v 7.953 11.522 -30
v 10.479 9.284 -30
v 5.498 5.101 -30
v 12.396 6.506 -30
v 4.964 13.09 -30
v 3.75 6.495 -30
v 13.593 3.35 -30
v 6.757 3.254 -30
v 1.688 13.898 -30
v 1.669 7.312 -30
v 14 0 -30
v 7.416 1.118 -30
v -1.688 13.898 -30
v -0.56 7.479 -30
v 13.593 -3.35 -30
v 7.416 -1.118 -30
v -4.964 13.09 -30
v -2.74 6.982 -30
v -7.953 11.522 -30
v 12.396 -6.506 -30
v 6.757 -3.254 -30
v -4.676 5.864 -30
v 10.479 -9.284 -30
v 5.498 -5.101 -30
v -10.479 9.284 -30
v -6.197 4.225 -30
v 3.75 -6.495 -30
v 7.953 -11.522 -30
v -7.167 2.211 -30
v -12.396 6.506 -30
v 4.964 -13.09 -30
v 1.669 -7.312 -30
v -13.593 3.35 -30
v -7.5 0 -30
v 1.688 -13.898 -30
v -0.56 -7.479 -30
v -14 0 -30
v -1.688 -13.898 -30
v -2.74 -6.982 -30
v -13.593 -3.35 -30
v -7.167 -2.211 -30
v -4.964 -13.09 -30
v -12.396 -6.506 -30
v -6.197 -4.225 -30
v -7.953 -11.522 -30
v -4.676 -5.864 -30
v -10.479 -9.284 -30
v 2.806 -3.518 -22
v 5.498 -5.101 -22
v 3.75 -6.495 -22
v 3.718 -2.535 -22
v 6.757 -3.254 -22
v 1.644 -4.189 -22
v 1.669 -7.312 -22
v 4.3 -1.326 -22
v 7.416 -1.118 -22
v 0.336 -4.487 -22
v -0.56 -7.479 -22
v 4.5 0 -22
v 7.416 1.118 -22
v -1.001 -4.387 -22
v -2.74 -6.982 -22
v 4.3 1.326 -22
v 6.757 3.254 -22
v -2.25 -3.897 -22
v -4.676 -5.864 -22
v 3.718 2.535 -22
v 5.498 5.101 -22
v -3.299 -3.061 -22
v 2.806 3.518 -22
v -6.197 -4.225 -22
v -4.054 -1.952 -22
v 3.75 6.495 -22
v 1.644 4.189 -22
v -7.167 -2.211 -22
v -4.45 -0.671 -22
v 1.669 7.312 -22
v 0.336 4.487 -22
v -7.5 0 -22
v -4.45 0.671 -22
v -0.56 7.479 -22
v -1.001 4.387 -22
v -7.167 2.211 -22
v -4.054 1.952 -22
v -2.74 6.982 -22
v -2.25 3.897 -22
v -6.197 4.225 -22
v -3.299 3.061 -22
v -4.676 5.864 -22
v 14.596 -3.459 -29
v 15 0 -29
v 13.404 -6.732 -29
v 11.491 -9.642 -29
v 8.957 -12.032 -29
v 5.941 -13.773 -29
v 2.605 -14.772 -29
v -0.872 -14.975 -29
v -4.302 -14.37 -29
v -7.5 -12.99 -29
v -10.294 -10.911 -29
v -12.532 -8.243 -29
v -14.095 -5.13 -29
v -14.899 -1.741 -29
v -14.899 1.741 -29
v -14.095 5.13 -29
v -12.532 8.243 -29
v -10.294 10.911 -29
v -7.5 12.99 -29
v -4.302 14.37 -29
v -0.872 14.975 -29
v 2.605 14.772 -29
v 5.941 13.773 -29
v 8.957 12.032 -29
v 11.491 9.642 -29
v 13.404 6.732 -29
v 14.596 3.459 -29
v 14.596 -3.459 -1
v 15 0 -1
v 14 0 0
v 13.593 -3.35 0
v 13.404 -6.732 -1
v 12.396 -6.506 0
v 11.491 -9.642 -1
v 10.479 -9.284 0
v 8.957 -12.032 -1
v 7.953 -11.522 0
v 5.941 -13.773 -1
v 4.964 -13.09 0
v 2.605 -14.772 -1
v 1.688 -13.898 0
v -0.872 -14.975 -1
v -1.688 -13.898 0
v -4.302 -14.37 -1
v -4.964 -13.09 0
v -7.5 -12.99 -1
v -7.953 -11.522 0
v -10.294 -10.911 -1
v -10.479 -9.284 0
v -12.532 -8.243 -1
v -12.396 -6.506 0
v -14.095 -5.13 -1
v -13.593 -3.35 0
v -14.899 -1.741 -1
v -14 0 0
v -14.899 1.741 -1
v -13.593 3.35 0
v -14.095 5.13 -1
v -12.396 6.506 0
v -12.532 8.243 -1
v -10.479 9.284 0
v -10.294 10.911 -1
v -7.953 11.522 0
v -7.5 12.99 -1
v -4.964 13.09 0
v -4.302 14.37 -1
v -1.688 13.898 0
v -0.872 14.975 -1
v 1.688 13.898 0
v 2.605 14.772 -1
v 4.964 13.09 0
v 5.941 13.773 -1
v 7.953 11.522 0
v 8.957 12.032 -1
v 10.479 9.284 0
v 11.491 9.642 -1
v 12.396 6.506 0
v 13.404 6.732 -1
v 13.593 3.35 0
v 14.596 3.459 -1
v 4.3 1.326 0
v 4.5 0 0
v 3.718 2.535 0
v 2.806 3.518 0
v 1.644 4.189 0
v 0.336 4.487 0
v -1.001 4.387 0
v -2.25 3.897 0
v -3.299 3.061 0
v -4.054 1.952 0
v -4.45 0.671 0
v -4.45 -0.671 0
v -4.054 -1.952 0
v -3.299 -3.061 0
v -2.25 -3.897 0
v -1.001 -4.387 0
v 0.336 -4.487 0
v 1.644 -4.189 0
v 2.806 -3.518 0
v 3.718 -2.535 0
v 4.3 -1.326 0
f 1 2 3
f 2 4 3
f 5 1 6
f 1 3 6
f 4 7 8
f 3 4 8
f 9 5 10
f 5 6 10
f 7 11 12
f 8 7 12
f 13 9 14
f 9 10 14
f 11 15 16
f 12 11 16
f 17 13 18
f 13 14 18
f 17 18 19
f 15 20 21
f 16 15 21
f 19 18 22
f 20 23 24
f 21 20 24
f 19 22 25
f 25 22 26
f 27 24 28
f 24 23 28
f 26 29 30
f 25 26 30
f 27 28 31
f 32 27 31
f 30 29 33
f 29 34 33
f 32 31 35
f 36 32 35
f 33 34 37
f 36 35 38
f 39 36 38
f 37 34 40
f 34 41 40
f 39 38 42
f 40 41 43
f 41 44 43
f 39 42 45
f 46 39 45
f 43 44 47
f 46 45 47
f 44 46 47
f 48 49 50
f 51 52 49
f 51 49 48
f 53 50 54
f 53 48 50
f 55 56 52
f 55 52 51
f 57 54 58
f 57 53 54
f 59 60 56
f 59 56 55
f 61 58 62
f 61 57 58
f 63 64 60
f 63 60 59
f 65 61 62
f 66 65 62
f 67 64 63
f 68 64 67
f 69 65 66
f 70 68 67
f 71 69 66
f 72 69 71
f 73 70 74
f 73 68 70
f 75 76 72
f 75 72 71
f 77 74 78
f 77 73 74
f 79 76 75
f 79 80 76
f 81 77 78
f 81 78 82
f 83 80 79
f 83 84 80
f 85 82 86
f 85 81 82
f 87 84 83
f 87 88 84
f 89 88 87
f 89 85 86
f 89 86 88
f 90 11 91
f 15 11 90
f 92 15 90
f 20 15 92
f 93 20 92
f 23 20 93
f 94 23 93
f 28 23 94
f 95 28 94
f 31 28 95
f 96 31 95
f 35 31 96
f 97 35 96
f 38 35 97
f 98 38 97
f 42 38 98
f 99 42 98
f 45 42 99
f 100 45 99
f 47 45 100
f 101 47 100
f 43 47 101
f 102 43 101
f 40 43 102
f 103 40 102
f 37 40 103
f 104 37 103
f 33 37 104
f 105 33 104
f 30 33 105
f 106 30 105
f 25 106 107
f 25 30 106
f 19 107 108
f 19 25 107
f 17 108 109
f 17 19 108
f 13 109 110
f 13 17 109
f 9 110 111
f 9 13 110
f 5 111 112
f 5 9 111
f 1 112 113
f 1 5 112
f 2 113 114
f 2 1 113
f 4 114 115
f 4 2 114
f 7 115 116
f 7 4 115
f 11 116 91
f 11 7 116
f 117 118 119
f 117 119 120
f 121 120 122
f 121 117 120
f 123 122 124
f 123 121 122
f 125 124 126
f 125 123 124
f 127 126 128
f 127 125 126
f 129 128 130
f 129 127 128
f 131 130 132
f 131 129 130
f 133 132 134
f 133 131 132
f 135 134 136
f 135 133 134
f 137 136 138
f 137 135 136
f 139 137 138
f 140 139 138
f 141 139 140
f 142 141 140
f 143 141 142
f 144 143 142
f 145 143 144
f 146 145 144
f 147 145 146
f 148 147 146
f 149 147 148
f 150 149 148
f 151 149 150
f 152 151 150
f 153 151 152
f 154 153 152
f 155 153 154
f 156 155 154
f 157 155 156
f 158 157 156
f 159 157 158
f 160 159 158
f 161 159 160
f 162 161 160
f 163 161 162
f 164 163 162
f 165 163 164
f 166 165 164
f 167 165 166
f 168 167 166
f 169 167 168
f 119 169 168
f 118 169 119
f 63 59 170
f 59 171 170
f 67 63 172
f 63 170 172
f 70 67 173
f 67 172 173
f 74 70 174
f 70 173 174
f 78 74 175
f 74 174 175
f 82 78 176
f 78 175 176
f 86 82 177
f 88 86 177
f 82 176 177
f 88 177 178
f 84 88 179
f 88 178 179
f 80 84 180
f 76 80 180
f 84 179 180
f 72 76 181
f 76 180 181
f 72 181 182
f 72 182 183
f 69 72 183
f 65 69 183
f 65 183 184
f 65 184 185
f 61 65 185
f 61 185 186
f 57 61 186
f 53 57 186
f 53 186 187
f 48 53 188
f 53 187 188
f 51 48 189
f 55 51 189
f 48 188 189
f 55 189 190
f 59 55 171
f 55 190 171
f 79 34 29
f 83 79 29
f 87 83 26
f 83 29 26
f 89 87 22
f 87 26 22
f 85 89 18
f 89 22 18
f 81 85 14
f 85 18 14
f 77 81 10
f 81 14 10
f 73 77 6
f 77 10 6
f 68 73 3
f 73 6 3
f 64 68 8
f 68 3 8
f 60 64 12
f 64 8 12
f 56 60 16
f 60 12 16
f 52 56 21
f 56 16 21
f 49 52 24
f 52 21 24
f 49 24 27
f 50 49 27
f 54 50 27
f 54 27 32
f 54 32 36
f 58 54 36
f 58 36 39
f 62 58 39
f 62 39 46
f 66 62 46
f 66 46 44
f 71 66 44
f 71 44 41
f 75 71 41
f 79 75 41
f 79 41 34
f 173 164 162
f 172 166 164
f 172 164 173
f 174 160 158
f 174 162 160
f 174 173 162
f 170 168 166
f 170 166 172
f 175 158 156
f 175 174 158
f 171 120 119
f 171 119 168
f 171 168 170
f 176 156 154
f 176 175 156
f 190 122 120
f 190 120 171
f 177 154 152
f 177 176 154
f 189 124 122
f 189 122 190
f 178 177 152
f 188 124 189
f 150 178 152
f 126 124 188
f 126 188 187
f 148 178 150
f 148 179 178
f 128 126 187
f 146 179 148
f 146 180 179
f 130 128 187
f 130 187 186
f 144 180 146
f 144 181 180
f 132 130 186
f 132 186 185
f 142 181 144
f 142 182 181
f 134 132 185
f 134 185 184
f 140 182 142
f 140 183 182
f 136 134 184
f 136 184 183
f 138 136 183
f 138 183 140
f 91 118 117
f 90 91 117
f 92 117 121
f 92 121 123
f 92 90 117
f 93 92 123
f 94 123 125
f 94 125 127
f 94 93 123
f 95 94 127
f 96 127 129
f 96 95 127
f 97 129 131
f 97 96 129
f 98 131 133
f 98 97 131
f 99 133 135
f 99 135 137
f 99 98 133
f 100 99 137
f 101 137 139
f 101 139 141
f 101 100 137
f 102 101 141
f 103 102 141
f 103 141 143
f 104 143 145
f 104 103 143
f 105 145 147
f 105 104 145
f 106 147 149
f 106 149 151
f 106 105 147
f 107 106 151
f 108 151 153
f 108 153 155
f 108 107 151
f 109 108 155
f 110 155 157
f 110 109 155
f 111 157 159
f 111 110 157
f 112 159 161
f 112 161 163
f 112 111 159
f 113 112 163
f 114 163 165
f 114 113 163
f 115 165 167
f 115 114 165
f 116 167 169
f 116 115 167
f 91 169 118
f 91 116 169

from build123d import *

# Parameters (mm, degrees)
SKETCH_1_W                   = 30
SKETCH_1_H                   = 15
HOLE_WIZARD_M8_1_D           = 9
HOLE_WIZARD_M8_1_CBORE_D     = 15
HOLE_WIZARD_M8_1_CBORE_DEPTH = 8
CHAMFER_1_SIZE               = 1


with BuildPart() as part:
    # 草圖1 → 旋轉1 (revolve)
    with BuildSketch(Plane(origin=(0, 0, 0), x_dir=(0, 0, -1), z_dir=(1, 0, 0)), mode=Mode.PRIVATE) as revolve_1_sk:
        with Locations((15, 7.5)):
            Rectangle(SKETCH_1_W, SKETCH_1_H)
    revolve(revolve_1_sk.sketch.rotate(Axis((0, 0, 2.831513271), (0, 0, -1)), 90), axis=Axis((0, 0, 2.831513271), (0, 0, -1)))

    # M8 六角承窩頭蓋螺釘的柱孔1 (through all)
    with Locations(Plane(origin=(0, 0, -30), x_dir=(-1, 0, 0), z_dir=(0, 0, -1))):
        with Locations((0, 0)):
            CounterBoreHole(HOLE_WIZARD_M8_1_D / 2, HOLE_WIZARD_M8_1_CBORE_D / 2, HOLE_WIZARD_M8_1_CBORE_DEPTH)

    # 導角1
    chamfer_1_edges = [part.edges().sort_by_distance(p)[0] for p in [
        (-15, 0, -30),
        (-15, 0, 0),
    ]]
    chamfer(chamfer_1_edges, length=CHAMFER_1_SIZE)


solid = part.part
